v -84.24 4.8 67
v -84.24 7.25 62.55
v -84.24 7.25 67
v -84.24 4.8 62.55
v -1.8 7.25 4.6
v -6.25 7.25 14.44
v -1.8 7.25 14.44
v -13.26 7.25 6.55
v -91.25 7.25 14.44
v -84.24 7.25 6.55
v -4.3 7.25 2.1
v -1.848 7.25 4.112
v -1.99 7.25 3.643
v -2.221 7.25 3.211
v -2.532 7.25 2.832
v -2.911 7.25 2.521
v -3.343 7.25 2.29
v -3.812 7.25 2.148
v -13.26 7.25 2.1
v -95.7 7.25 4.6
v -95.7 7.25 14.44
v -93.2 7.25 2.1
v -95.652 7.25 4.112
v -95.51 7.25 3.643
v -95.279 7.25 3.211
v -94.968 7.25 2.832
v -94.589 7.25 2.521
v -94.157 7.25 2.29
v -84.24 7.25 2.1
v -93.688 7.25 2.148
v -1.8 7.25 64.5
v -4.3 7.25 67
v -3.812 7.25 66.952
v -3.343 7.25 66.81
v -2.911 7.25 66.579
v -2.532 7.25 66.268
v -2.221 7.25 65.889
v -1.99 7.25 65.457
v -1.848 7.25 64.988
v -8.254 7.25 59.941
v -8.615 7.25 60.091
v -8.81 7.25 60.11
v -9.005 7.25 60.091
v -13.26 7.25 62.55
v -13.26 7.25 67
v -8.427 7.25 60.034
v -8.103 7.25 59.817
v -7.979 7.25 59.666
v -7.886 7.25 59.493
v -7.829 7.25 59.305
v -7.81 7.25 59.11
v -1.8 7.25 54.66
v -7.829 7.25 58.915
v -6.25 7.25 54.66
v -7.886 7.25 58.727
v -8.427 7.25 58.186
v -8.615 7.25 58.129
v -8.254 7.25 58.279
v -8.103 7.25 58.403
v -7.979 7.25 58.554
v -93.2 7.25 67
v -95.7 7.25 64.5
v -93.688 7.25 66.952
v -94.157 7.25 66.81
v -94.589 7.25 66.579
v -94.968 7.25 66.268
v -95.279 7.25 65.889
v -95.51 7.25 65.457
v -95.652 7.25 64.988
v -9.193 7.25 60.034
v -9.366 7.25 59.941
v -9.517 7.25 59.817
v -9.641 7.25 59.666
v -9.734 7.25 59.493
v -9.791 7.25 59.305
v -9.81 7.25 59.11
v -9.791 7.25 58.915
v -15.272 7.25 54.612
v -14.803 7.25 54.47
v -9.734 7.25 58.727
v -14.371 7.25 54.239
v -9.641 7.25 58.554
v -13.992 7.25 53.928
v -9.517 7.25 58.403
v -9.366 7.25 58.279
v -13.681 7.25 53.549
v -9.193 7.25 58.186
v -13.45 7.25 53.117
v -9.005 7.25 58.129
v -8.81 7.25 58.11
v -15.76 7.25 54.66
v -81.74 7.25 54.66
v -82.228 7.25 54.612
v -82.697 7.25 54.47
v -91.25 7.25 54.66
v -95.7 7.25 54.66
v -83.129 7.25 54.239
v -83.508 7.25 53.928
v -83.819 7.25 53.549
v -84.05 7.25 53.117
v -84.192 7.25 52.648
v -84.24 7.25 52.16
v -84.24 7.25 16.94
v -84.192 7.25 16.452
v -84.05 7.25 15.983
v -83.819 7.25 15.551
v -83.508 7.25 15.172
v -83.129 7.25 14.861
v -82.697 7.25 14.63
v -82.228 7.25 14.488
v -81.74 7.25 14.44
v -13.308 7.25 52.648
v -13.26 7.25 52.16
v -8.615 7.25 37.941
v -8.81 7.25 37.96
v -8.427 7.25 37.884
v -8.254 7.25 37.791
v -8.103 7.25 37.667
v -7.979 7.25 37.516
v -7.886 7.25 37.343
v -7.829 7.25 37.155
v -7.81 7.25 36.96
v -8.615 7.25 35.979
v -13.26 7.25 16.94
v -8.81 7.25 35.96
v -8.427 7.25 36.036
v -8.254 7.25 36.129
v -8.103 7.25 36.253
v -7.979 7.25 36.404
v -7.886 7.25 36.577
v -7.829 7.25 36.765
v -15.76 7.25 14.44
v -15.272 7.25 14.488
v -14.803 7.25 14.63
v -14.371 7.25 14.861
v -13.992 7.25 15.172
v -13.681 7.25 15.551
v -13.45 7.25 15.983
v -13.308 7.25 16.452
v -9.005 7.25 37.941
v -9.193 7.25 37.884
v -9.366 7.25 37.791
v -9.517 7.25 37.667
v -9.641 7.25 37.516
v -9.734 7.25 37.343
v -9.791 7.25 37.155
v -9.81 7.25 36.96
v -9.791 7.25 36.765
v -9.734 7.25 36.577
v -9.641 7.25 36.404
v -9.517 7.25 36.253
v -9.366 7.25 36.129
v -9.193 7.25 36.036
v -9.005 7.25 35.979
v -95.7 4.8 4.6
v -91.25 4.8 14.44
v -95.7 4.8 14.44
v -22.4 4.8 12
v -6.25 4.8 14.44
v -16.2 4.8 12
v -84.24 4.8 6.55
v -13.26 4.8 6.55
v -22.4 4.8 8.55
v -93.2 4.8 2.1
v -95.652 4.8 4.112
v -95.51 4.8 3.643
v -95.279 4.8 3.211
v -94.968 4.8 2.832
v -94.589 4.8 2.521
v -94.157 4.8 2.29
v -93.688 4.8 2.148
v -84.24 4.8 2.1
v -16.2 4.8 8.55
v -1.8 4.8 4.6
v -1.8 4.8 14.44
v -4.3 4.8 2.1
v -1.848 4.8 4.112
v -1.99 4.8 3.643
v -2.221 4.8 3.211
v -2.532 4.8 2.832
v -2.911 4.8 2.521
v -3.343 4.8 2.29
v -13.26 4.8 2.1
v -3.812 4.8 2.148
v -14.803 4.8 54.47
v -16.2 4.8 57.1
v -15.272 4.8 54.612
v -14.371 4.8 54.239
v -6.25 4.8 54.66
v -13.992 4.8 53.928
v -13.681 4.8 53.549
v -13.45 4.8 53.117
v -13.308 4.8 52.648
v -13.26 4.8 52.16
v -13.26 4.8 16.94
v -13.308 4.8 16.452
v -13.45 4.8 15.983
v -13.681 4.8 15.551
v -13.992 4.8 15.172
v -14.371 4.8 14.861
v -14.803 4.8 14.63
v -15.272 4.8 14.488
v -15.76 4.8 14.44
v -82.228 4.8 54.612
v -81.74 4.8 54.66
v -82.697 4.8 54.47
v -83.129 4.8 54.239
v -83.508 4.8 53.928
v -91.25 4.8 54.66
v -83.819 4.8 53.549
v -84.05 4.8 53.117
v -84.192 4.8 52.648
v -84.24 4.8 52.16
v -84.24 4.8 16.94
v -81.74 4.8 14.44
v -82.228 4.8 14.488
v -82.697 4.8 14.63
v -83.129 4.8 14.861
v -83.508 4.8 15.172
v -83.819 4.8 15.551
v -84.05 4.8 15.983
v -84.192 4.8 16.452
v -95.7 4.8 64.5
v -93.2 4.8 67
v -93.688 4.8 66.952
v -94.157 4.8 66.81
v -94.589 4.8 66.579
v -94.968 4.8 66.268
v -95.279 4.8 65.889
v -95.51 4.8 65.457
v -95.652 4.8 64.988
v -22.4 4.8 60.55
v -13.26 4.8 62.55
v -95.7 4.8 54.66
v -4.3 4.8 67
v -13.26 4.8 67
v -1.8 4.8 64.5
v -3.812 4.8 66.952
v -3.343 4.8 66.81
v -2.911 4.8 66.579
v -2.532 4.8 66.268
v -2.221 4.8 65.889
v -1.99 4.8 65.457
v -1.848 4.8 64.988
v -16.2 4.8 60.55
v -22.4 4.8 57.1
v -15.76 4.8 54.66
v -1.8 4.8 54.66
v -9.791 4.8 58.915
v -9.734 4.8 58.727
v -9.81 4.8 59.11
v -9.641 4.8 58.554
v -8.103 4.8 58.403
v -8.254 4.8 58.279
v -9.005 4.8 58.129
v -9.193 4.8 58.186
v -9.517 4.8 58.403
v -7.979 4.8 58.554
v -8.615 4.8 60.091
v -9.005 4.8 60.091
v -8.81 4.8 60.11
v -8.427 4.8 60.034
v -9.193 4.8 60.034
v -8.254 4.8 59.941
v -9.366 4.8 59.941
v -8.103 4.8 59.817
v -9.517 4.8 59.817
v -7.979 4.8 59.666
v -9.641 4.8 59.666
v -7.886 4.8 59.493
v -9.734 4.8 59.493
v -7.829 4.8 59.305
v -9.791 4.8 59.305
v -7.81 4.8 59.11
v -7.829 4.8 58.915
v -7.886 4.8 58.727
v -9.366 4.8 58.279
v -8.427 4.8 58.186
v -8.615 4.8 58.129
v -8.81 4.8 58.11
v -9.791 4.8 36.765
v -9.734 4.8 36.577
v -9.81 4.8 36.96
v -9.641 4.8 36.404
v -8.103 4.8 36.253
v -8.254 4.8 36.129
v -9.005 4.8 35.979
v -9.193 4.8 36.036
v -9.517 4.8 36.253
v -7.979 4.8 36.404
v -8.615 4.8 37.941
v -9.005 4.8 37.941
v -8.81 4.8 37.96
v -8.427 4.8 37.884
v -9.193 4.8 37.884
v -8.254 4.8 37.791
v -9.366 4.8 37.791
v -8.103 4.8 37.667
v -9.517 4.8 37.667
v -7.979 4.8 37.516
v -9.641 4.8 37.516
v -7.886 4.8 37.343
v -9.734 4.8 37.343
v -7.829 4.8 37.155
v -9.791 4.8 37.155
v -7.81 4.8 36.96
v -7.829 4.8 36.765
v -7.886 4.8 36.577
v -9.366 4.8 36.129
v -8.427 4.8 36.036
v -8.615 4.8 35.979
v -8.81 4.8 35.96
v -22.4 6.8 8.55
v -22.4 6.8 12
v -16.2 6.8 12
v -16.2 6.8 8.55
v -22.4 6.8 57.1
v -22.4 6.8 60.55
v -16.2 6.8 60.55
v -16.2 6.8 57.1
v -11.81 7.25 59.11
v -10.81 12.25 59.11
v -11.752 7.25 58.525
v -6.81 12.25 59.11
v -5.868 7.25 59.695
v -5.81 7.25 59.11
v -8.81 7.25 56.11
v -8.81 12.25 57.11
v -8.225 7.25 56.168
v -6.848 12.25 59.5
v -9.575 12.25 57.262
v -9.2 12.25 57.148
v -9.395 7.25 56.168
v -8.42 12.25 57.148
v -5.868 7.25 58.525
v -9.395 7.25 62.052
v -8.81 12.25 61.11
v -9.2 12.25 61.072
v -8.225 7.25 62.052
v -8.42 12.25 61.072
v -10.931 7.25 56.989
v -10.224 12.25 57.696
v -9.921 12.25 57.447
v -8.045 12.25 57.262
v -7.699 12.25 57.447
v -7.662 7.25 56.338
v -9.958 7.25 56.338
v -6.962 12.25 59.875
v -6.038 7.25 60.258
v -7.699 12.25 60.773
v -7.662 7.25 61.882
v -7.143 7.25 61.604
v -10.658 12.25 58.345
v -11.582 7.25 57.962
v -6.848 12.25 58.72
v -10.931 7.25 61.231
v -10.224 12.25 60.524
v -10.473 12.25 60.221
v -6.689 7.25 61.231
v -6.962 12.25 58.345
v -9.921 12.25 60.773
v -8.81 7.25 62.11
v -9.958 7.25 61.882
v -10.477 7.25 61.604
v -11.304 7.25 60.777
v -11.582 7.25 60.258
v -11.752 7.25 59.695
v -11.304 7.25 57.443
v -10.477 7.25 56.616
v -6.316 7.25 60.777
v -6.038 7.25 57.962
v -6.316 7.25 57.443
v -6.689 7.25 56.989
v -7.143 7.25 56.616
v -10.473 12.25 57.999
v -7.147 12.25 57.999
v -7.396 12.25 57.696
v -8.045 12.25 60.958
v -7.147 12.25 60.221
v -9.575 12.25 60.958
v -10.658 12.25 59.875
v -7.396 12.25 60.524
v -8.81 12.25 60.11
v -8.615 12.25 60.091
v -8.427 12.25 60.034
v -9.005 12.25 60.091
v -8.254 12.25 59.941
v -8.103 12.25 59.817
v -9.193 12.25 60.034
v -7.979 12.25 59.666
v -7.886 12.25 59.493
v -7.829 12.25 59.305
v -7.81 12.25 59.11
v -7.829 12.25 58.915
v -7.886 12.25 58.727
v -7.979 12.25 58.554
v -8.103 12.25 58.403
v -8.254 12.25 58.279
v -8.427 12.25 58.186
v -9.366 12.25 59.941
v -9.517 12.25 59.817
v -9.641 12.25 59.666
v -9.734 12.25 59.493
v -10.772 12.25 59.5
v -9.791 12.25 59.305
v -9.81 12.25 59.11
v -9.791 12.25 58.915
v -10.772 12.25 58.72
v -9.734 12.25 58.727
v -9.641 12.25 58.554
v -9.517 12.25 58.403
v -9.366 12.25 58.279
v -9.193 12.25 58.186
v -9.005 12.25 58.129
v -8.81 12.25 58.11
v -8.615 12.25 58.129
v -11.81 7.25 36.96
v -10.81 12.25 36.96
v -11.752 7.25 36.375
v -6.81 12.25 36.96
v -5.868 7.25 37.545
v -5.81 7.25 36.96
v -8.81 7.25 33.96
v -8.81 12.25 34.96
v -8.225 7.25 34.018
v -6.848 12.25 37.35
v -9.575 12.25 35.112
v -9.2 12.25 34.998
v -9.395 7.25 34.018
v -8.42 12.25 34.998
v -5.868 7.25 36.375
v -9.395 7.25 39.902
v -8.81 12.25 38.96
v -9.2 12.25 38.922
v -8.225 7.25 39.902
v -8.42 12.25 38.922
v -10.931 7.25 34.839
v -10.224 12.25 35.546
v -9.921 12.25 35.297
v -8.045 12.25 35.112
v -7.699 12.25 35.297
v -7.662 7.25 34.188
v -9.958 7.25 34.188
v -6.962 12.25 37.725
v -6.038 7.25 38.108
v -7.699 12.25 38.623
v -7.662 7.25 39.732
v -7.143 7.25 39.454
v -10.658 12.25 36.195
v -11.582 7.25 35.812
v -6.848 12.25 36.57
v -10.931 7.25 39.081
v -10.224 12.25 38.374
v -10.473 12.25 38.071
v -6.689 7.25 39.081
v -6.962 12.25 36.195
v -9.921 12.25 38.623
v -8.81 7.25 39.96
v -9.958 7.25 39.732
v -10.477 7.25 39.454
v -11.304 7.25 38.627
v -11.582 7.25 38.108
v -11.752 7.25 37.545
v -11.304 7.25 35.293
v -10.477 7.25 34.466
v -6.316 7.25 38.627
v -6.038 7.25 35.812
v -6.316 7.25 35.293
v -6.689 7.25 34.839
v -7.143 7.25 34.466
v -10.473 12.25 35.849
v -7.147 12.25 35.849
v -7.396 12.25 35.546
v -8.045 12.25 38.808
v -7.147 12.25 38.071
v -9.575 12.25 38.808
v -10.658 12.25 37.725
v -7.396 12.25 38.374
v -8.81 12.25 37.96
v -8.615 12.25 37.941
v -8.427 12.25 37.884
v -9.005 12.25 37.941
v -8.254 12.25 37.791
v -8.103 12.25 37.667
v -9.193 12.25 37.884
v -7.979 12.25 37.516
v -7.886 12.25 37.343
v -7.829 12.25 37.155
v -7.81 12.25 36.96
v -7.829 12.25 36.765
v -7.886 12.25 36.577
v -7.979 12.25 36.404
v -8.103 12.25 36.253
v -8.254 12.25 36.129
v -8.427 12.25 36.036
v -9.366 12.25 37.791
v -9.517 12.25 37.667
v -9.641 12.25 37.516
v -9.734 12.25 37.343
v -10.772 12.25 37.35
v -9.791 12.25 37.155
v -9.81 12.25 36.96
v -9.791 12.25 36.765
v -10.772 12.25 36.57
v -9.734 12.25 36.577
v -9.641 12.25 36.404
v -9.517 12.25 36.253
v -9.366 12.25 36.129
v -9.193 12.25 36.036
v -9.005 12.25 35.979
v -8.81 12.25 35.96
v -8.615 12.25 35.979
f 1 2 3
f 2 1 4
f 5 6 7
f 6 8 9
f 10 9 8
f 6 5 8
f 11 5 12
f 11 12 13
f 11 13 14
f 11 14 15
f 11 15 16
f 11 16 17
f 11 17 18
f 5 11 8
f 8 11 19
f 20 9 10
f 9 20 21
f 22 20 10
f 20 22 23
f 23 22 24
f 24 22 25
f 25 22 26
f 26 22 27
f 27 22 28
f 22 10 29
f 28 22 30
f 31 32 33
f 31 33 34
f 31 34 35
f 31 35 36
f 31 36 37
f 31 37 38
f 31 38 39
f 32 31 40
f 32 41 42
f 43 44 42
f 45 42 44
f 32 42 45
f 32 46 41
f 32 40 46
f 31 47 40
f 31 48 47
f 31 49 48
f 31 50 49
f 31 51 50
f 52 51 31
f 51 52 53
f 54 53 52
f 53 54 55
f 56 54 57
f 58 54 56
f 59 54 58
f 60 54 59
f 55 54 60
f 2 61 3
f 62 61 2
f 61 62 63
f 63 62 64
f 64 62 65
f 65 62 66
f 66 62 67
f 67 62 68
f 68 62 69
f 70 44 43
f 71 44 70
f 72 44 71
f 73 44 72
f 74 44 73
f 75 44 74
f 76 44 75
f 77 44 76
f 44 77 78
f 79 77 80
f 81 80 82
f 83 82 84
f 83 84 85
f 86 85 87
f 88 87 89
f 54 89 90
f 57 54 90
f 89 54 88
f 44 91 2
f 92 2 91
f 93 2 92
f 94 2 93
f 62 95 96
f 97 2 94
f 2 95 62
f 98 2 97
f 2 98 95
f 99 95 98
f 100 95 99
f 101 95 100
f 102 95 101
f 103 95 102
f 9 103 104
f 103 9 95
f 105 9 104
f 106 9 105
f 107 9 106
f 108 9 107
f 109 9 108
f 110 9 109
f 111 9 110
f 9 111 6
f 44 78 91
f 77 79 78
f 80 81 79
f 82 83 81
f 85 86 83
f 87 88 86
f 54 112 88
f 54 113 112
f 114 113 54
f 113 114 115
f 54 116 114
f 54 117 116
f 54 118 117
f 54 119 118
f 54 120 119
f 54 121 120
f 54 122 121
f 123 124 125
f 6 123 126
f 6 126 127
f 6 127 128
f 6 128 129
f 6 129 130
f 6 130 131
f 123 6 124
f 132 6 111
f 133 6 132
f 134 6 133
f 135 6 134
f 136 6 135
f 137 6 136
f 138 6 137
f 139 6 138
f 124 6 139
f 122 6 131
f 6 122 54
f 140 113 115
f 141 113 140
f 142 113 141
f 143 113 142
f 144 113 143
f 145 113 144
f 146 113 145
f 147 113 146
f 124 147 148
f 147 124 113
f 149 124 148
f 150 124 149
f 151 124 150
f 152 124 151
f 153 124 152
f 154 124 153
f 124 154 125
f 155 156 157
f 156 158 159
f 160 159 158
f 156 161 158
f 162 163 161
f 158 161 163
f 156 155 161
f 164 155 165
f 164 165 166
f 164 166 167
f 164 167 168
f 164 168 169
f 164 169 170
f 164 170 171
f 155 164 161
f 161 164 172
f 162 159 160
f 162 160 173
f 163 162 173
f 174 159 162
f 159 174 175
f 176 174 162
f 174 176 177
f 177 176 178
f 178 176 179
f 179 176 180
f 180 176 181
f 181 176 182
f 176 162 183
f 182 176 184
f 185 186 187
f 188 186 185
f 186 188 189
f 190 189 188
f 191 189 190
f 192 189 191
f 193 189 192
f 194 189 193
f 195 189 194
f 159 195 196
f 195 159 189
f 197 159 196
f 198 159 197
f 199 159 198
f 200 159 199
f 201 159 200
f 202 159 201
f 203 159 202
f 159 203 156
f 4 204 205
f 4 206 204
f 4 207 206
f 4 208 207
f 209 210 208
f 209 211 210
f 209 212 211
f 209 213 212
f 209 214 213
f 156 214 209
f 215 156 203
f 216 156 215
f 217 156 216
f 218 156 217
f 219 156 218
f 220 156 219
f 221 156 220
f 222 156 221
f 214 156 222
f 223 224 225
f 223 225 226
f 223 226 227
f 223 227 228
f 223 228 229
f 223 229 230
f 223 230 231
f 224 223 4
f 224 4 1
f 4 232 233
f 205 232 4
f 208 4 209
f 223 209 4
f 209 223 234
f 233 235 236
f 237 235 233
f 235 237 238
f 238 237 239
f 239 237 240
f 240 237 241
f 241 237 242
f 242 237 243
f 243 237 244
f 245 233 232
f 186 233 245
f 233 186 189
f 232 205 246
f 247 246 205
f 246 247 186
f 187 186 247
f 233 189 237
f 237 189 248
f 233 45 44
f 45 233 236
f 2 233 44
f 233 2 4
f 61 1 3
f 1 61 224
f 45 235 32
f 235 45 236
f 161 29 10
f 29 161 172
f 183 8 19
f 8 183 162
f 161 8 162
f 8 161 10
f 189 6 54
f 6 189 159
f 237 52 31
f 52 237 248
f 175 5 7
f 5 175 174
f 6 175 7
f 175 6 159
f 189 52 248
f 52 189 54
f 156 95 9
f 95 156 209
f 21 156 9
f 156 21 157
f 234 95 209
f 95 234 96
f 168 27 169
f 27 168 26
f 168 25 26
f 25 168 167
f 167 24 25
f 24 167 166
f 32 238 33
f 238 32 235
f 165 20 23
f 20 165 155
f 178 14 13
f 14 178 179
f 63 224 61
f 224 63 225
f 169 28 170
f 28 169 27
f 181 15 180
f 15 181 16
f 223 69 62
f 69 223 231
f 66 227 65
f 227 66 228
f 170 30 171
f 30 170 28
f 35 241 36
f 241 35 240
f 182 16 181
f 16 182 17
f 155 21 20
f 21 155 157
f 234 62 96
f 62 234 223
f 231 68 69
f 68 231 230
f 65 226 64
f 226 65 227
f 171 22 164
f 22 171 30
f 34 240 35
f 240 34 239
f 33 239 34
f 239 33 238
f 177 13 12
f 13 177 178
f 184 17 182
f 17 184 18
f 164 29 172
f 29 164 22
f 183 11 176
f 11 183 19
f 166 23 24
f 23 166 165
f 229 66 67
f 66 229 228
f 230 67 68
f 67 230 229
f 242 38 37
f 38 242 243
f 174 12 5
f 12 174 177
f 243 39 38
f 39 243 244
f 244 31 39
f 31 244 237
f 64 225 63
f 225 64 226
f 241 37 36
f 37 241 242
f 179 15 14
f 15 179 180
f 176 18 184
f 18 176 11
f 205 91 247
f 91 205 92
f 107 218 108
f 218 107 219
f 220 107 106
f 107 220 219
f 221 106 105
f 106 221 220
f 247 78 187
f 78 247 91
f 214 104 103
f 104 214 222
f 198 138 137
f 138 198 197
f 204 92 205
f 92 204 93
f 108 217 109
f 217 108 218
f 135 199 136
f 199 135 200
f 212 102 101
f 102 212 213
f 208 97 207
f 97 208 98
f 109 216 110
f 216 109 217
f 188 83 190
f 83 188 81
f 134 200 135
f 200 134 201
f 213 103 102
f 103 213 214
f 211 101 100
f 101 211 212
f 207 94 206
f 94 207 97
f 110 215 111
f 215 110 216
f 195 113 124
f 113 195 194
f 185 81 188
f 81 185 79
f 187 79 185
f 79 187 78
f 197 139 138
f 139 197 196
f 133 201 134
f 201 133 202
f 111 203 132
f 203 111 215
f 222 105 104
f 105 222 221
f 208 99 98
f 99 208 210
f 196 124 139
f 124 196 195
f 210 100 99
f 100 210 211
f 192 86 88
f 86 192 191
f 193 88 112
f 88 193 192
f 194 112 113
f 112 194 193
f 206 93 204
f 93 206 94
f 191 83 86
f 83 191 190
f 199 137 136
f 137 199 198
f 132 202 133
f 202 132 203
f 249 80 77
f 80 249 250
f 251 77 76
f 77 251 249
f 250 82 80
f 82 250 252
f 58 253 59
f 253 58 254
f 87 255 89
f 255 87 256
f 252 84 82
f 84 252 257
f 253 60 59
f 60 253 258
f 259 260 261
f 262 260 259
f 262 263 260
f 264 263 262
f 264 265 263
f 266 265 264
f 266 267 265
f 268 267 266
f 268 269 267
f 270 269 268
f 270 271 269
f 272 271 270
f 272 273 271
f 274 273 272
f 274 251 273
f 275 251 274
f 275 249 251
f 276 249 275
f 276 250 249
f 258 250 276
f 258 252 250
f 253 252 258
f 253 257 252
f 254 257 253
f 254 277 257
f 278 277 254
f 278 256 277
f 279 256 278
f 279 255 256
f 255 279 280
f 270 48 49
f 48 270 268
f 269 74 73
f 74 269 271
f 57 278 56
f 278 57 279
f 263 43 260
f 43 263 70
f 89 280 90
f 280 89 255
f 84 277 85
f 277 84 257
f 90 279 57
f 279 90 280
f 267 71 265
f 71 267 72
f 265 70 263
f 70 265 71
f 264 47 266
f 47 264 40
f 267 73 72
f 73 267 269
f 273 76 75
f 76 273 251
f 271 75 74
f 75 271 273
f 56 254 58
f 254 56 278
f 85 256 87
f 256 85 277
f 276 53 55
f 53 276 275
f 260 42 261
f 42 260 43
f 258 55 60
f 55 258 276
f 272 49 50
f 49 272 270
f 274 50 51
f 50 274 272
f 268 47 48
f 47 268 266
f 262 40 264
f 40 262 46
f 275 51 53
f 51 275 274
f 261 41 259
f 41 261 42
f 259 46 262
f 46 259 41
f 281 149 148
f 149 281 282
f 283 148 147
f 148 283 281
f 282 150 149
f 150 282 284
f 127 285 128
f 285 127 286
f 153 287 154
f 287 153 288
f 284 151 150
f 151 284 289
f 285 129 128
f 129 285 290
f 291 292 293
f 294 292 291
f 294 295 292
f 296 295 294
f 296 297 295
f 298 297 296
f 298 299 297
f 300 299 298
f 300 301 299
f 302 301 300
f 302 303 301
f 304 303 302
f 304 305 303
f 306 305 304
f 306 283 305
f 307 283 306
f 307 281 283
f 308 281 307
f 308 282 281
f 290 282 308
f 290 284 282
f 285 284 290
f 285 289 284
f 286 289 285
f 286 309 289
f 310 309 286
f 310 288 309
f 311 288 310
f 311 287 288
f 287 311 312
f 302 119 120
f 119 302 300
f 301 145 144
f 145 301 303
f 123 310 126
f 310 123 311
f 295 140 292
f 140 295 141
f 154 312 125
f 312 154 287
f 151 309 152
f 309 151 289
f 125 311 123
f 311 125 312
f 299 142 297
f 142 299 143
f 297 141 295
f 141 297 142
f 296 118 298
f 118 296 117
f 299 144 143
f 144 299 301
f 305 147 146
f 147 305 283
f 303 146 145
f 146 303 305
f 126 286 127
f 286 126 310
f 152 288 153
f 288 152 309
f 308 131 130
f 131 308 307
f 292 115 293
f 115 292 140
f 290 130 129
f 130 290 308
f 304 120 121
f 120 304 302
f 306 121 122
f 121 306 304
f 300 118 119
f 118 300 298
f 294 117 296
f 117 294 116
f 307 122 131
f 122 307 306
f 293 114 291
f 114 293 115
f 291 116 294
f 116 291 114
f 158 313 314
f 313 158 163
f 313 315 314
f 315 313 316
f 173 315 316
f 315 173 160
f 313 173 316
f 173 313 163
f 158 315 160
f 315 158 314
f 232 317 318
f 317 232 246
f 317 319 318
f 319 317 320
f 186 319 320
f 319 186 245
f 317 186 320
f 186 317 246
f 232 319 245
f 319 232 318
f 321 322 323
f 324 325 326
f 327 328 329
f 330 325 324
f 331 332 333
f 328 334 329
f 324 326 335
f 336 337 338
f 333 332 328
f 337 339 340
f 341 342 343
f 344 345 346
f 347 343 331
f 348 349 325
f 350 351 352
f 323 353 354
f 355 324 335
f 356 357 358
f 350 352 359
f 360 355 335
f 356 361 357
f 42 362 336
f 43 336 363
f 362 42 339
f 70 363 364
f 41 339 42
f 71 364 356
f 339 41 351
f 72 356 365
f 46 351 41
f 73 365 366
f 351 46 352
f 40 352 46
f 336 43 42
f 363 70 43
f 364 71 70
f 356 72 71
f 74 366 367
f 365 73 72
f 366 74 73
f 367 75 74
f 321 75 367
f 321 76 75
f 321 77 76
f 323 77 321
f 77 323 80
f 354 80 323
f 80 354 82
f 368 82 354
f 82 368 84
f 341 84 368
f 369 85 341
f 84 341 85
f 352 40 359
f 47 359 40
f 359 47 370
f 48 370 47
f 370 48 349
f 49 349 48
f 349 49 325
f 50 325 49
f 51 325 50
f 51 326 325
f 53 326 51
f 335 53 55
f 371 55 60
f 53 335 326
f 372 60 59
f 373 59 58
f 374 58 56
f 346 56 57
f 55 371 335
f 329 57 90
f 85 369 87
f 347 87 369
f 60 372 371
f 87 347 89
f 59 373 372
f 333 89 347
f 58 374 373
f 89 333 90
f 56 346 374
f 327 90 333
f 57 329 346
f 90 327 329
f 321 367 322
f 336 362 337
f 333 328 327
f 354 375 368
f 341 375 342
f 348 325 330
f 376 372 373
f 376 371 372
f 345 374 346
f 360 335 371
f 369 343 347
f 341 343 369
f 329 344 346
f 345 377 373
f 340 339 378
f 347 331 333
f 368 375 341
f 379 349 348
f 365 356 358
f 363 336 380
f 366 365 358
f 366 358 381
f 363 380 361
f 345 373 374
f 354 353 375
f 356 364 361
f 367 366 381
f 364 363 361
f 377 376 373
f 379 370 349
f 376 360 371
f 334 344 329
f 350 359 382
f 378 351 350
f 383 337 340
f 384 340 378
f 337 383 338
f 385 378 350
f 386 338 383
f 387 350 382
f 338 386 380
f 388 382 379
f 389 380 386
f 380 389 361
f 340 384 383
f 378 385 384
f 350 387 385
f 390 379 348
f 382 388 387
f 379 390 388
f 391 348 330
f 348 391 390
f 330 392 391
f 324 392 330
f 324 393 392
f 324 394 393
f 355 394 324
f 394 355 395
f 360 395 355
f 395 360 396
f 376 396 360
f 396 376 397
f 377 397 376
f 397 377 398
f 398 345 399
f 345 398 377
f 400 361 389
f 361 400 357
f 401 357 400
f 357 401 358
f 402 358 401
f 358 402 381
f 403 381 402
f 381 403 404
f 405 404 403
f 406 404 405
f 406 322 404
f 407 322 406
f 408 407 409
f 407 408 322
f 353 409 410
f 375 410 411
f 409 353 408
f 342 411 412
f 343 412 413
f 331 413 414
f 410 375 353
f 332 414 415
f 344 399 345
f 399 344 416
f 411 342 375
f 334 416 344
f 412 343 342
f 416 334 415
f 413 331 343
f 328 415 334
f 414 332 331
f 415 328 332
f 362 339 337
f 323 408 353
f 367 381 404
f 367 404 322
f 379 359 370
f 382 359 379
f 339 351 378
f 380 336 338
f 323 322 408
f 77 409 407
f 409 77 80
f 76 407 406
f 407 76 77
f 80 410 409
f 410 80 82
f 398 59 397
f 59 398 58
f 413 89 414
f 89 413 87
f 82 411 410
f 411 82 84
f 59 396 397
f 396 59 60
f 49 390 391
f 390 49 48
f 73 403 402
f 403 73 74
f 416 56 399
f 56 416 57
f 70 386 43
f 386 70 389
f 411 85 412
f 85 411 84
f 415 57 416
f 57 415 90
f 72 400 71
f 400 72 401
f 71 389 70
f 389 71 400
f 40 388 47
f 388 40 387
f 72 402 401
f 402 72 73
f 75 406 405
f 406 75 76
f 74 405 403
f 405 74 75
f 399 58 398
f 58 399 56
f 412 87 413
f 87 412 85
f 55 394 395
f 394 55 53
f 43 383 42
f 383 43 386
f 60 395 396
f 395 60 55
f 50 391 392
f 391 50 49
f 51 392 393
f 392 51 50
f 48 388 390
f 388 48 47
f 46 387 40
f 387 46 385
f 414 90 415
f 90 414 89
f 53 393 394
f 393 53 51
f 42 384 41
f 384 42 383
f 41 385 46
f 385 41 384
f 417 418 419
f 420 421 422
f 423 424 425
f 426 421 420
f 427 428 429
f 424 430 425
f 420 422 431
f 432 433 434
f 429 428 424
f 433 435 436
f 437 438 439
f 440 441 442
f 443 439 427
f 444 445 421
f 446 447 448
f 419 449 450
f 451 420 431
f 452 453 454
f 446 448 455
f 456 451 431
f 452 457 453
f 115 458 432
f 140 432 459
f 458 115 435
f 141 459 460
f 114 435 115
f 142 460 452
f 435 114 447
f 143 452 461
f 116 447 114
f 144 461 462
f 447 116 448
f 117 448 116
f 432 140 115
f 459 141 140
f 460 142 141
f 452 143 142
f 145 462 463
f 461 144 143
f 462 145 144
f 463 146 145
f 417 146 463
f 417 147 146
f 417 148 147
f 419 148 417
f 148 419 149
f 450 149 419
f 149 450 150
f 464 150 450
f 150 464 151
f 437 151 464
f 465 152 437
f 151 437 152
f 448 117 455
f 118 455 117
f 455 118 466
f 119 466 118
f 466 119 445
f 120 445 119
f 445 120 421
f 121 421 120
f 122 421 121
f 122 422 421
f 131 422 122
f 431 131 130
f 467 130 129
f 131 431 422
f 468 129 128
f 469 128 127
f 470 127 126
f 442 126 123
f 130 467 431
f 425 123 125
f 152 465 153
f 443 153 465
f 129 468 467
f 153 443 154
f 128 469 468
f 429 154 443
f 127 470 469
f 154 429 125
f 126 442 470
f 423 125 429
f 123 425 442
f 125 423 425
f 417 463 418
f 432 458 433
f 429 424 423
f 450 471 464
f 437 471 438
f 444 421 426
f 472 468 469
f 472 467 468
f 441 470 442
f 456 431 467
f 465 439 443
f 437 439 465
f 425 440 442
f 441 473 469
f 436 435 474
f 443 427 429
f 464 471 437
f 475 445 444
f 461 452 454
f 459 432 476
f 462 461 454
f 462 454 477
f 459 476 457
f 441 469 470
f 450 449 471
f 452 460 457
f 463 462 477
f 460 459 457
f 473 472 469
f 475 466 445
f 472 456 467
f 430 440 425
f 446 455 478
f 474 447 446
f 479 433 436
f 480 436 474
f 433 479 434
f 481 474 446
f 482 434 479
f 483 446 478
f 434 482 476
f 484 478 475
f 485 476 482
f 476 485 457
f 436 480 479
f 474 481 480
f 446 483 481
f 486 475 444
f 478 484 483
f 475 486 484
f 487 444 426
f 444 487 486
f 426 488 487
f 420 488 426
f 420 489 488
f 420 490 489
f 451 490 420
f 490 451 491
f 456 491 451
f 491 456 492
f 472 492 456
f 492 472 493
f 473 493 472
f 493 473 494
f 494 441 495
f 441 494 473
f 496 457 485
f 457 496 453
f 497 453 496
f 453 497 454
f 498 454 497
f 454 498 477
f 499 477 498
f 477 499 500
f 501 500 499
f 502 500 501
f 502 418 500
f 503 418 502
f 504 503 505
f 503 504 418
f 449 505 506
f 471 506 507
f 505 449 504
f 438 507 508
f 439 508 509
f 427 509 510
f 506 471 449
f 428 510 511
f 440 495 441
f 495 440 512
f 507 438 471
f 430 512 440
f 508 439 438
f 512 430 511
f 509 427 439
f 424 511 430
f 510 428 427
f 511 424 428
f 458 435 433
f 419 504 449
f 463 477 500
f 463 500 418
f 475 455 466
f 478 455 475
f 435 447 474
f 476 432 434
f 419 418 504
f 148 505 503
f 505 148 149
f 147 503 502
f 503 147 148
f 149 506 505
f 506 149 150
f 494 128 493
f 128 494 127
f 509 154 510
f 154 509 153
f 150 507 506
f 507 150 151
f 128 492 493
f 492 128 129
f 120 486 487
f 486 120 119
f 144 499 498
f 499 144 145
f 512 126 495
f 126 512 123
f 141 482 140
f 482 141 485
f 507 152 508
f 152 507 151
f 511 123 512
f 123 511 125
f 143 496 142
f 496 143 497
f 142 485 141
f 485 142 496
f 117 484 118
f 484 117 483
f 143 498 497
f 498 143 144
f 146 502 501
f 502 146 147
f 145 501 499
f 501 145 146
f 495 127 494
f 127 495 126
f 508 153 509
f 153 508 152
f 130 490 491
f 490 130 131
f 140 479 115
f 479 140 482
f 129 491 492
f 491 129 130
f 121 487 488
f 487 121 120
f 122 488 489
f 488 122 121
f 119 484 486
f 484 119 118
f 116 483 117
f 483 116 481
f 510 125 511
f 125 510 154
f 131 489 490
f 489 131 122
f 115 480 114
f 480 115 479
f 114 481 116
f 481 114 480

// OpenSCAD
$fn=32;

/*********************
*  board dimensions  *
*********************/

// raspberry pi 4b
sbc_x = 85;
sbc_y = 56;
sbc_screw_dia = 2.7;
sbc_screw_rim_x = 3.5;
sbc_screw_x     = 58;
sbc_screw_rim_y = 3.5;
sbc_screw_y     = 49;
sbc_screw_h     = 3;

// ups dimensions
ups_x           = 85;
ups_y           = 56;
ups_screw_dia   = 2.7;
ups_screw_rim_x = 3.5;
ups_screw_x     = 58;
ups_screw_rim_y = 3.5+5;
ups_screw_y     = 49;
ups_screw_h     = 3;

// esp32 dimensions
esp_x           = 64.47;
esp_y           = 27;
esp_screw_dia   = 2;
esp_screw_rim_x = 2.56;
esp_screw_x     = 0;
esp_screw_rim_y = 3.44;
esp_screw_y     = 22.15;


// raspberry pi zero 2W
/*
sbc_x           = 65;
sbc_y           = 30;
sbc_screw_dia   = 2.7;
sbc_screw_rim_x = 3.5;
sbc_screw_x     = 58;
sbc_screw_rim_y = 3.5;
sbc_screw_y     = 23;
sbc_screw_h     = 0.4;

// ups dimensions
ups_x           = 0;
ups_y           = 0;
ups_screw_dia   = 2.7;
ups_screw_rim_x = 3.5;
ups_screw_x     = 58;
ups_screw_rim_y = 3.5;
ups_screw_y     = 49;

// esp32 dimensions
esp_x           = 64.47;
esp_y           = 27;
esp_screw_dia   = 2;
esp_screw_rim_x = 2.56;
esp_screw_x     = 0;
esp_screw_rim_y = 3.44;
esp_screw_y     = 22.15;
*/


/********************
*  case dimensions  *
********************/

// backplane
backplane_y             = 100;
backplane_x             = 120;
backplane_wall          = 1.8;
backplane_screw_dia     = 2.7;
backplane_screw_x       = 0;
backplane_screw_rim_x   = backplane_x/2;
backplane_screw_y       = 77.5;
backplane_screw_rim_y   = (backplane_y - backplane_screw_y)/2;
backplane_slots         = 3;

// carrier
carrier_frame_x         = max(sbc_x,ups_x,esp_x);
carrier_frame_y         = max(sbc_y,ups_y,esp_y);
carrier_frame_height    = 3;
carrier_frame_addition  = 5;
carrier_screw_h         = 5;
carrier_distance        = 27.2;
carrier_gap             = 0.55;

// battery
battery_x               = backplane_x-2*backplane_wall;
battery_y               = max(60,carrier_frame_y+2*carrier_frame_addition);
battery_h               = 11;

// solar adapter
solar_x                 = 19.5;
solar_y                 = 38.5;
solar_z                 = 11.3;


mirror([1,0,0])
{
    esp_carrier();
}
//sbc_carrier();
//ups_carrier();
//case();

/************
*  modules  *
************/

module case()
{
    // main case
    difference()
    {
        cube_round([backplane_x,
                    backplane_y,
                    max(carrier_frame_y+2*carrier_frame_addition,battery_y)]
                  +[0,0,backplane_wall]);
        
        // inner cutout
        translate([backplane_wall,backplane_wall,backplane_wall])
        {
            cube_round([backplane_x,
                        backplane_y,
                        max(carrier_frame_y+2*carrier_frame_addition,
                            battery_y)]
                      -[2*backplane_wall,2*backplane_wall,0]);
        }
        // board access
        translate([0,backplane_wall,backplane_wall+carrier_frame_addition])
        {
            cube([backplane_wall,
                  min(backplane_slots*carrier_distance,
                      backplane_y-battery_h-3*backplane_wall),
                  carrier_frame_y]);
        }
        // wall cutout
        translate([backplane_wall+carrier_frame_addition-2,
                   0,
                   carrier_frame_addition+backplane_wall])
        {
            cube_round([backplane_x,backplane_y-battery_h-4*backplane_wall,300],plane="xz");
            translate([2*backplane_wall,0,0])
                cube_round([backplane_x,backplane_y-battery_h-2*backplane_wall,300],plane="yz");
        }
        // bottom cutout
        translate([carrier_frame_addition+backplane_wall+10+5+backplane_wall,
                   3*backplane_wall,
                   0])
        {
            cube_round([backplane_x/2
                        -(carrier_frame_addition+backplane_wall+10+5+backplane_wall)
                        -backplane_screw_dia/2-backplane_wall,
                         backplane_y-battery_h-7*backplane_wall,
                         backplane_wall]);
            translate([0,+battery_h/2+backplane_screw_dia/2+2*backplane_wall,0])
            {
                cube_round([carrier_frame_x-15,
                            backplane_screw_y-battery_h-backplane_screw_dia+2*backplane_wall,
                            backplane_wall]);
            }
        }
        //screw holes
        translate([0,0,backplane_wall])
        {
            screw_holes(screw_dia=backplane_screw_dia,
                    screw_rim_x=backplane_screw_rim_x,
                    screw_x=backplane_screw_x,
                    screw_rim_y=backplane_screw_rim_y,
                    screw_y=backplane_screw_y,
                    screw_h=0,
                    frame_height=backplane_wall,
                    massive=true);
        }
    }

    // battery box
    translate([0,backplane_y-2*backplane_wall-battery_h,backplane_wall])
    {
        battery_box(x=battery_x,
                    y=battery_y,
                    h=battery_h,
                    wall=backplane_wall);
    }
    
    // solar box
    translate([backplane_x-solar_x-2*backplane_wall,5,0])
    {
        solar(x=solar_x,
              y=solar_y,
              z=solar_z,
              wall=backplane_wall);
    }

    // carrier holder
    carrier_holder(height1=carrier_frame_y+2*carrier_frame_addition,
                   height2=carrier_frame_addition,
                   wall=backplane_wall,
                   carrier_frame_height=carrier_frame_height,
                   carrier_frame_addition=carrier_frame_addition,
                   carrier_frame_x=carrier_frame_x+2*carrier_frame_addition);
}




// battery box
module battery_box(x,y,h,wall)
{
    // location of cable opening
    cable_loc_x = 80;
    cable_dim_x = 10;
    cable_dim_y = 10;
    airgap      = 5;
    
    difference()
    {
        cube_round([x,h,y]
                  +[2*wall,2*wall,0]);
        
        // inner cutout
        translate([wall,wall,0])
        {
            cube_round([x,h,y]);
        }
        
        // cable opening
        translate([cable_loc_x,0,-wall])
        {
            cube_round([cable_dim_x,wall,cable_dim_y],plane="xz");
        }
        
        // air gaps
        for(i=[airgap:2*airgap:backplane_x-2*airgap])
        {
            translate([wall+i,0,cable_dim_y+airgap])
            {
                cube_round([airgap,wall,y-2*airgap-cable_dim_y],mki=airgap-1,plane="xz");
            }
        }
    }
}

// solar box
module solar(x,y,z,wall)
{
    difference()
    {
        cube_round([x,y,z]+[2*wall,2*wall-5,wall],mki=2);
        translate([wall,wall,wall])
        {
            cube([x,y+wall-5,z]);
        }
        translate([wall,-5,wall])
        {
            cube([x,y-5,3.2]);
        }
    }
    translate([wall,y+wall-5,wall])
    {
        cube([x,wall,3.2]);
    }
    translate([wall,y-wall-5,wall])
    {
        cube([x,2*wall,1.3]);
    }
    translate([wall+x/2-5/2,0,wall])
    {
        cube([5,2*wall,1.3]);
    }
}

// esp carrier
module esp_carrier()
{
    translate([backplane_wall,
               backplane_wall+carrier_frame_addition-2,
               backplane_wall+carrier_frame_y+2*carrier_frame_addition-0.8])
    {
        rotate([270,0,0])
        {
            carrier(x=carrier_frame_x,
                    y=carrier_frame_y,
                    frame_height=carrier_frame_height-carrier_gap,
                    frame_addition=carrier_frame_addition-carrier_gap,
                    screw_rim_x=esp_screw_rim_x,
                    screw_x=esp_screw_x,
                    screw_rim_y=esp_screw_rim_y,
                    screw_y=esp_screw_y,
                    screw_h=carrier_screw_h,
                    screw_dia=esp_screw_dia,
                    cut_sides="xy");
        }
    }
}

// sbc carrier
module sbc_carrier()
{
    translate([backplane_wall,
               backplane_wall+carrier_distance+carrier_frame_addition-2,
               backplane_wall+carrier_frame_y+2*carrier_frame_addition-0.8])
    {
        rotate([270,0,0])
        {
            carrier(x=carrier_frame_x,
                    y=carrier_frame_y,
                    frame_height=carrier_frame_height-carrier_gap,
                    frame_addition=carrier_frame_addition-carrier_gap,
                    screw_rim_x=sbc_screw_rim_x,
                    screw_x=sbc_screw_x,
                    screw_rim_y=sbc_screw_rim_y,
                    screw_y=sbc_screw_y,
                    screw_h=sbc_screw_h,
                    screw_dia=sbc_screw_dia,
                    cut_sides="xy");
        }
    }
}

// ups carrier
module ups_carrier()
{
    translate([backplane_wall,
               backplane_wall+2*carrier_distance+carrier_frame_addition-2,
               backplane_wall+carrier_frame_y+2*carrier_frame_addition-0.8])
    {
        rotate([270,0,0])
        {
            carrier(x=carrier_frame_x,
                    y=carrier_frame_y,
                    frame_height=carrier_frame_height-carrier_gap,
                    frame_addition=carrier_frame_addition-carrier_gap,
                    screw_rim_x=ups_screw_rim_x,
                    screw_x=ups_screw_x,
                    screw_rim_y=ups_screw_rim_y,
                    screw_y=ups_screw_y,
                    screw_h=ups_screw_h,
                    screw_dia=ups_screw_dia,
                    cut_sides="x");
        }
    }
}





// carrier holder
module carrier_holder(height1,
                      height2=10,
                      wall,
                      carrier_frame_height,
                      carrier_frame_addition,
                      carrier_frame_x)
{

    for(dist=[wall
             :carrier_distance
             :min(backplane_y-battery_h-3*wall-carrier_distance,
                  backplane_slots*carrier_distance)])
    {
        translate([0,dist,0])
        {
            cube([wall,2*(carrier_frame_addition-2)+carrier_frame_height,height1]);
            holder(depth=carrier_frame_addition-2,
                   width=carrier_frame_addition-2,
                   height=height1,
                   wall=wall,
                   carrier_frame_height=carrier_frame_height);

            translate([carrier_frame_x-carrier_frame_addition+2,0,0])
            {
                holder(depth=carrier_frame_addition-2,
                       width=carrier_frame_addition-2,
                       height=height2,
                       wall=wall,
                       carrier_frame_height=carrier_frame_height);
            }
            // clip
            translate([carrier_frame_addition+wall+10,1,wall])
            {
                clip();
            }
        }
    }
    // low wall
    translate([wall+carrier_frame_x,wall,wall])
    {
        cube([wall,
              min(backplane_y-battery_h-carrier_distance+2,
                  (backplane_slots-1)*carrier_distance+2*(carrier_frame_addition-2)+carrier_frame_height),
              height2]);
    }
}


// holder element
module holder(depth,width,height,wall,carrier_frame_height)
{
    //cube([wall,2*width+carrier_frame_height,height]);
    translate([wall,0,wall])
    {
        cube([depth,width,height]);
        translate([0,width+carrier_frame_height,0])
        {
            cube([depth,width,height]);
        }
    }
}


module carrier(x,
               y,
               frame_height,
               frame_addition,
               screw_rim_x,
               screw_x,
               screw_rim_y,
               screw_y,
               screw_h,
               screw_dia,
               screw_h=5,
               cut_sides)
{
    difference()
    {
        carrier_frame(x=x,
                      y=y,
                      frame_height=frame_height,
                      frame_addition=frame_addition,
                      screw_rim_x=screw_rim_x,
                      screw_rim_y=screw_rim_y,
                      cut_sides=cut_sides);
        translate([frame_addition,frame_addition,frame_height])
        {
            screw_holes(screw_dia=screw_dia,
                        screw_rim_x=screw_rim_x,
                        screw_x=screw_x,
                        screw_rim_y=screw_rim_y,
                        screw_y=screw_y,
                        screw_h=screw_h,
                        frame_height=frame_height,
                        massive=true);
        }
        // gap for clip
        translate([carrier_frame_addition+10-0.6,y-1,0]){
            cube([5+2*0.6,frame_addition-1,2]);
        }
        //translate([-(5+2*0.6+1)+x-carrier_frame_addition,carrier_frame_addition+2,0]){
        //    #cube([7+2*0.6,frame_addition-1,2]);
        //}
        translate([carrier_frame_addition+10-0.6,frame_addition+2,0]){
            #cube([5+2*0.6,frame_addition-1,2]);
        }
    }
    translate([frame_addition,frame_addition,frame_height])
    {
        screw_holes(screw_dia=screw_dia,
                        screw_rim_x=screw_rim_x,
                        screw_x=screw_x,
                        screw_rim_y=screw_rim_y,
                        screw_y=screw_y,
                        screw_h=screw_h,
                        frame_height=frame_height,
                        massive=false);
    }
}


// carrier_frame frame module
module carrier_frame(x,
                     y,
                     frame_height,
                     frame_addition,
                     screw_rim_x,
                     screw_rim_y,
                     cut_sides="x")
{
    difference()
    {
        cube_round([x+2*frame_addition,y+2*frame_addition,frame_height]);
        // center cutout
        translate([2*frame_addition+screw_rim_x,
                   2*frame_addition+screw_rim_y,
                   0])
        {
            cube_round([x-2*(frame_addition+screw_rim_x),
                   y-2*(frame_addition+screw_rim_y),
                   frame_height]);
        }
        // side cutouts
        if(cut_sides == "y" || cut_sides == "xy")
        {
            translate([2*frame_addition+screw_rim_x,0,0])
            {
                cube([x-2*(frame_addition+screw_rim_x),
                      frame_addition,
                      frame_height]);
            }
            translate([2*frame_addition+screw_rim_x,y+frame_addition,0])
            {
                cube([x-2*(frame_addition+screw_rim_x),
                      frame_addition,
                      frame_height]);
            }
        }
        if(cut_sides == "x" || cut_sides == "xy")
        {
            translate([0,2*frame_addition+screw_rim_y,0])
            {
                cube([frame_addition,
                       y-2*(frame_addition+screw_rim_y),
                       frame_height]);
            }
            translate([x+frame_addition,2*frame_addition+screw_rim_y,0])
            {
                cube([frame_addition,
                       y-2*(frame_addition+screw_rim_y),
                       frame_height]);
            }
        }
    }
}


module screw_holes(screw_dia,
                   screw_rim_x,
                   screw_x,
                   screw_rim_y,
                   screw_y,
                   screw_h,
                   frame_height,
                   massive=false)
{
    translate([screw_rim_x,screw_rim_y,0])
    {
        screw_hole(dia=screw_dia,
                   height=screw_h,
                   depth=frame_height,
                   massive=massive);
    }
    translate([screw_rim_x,screw_rim_y+screw_y,0])
    {
        screw_hole(dia=screw_dia,
                   height=screw_h,
                   depth=frame_height,
                   massive=massive);
    }
    translate([screw_rim_x+screw_x,screw_rim_y+screw_y,0])
    {
        screw_hole(dia=screw_dia,
                   height=screw_h,
                   depth=frame_height,
                   massive=massive);
    }
    translate([screw_rim_x+screw_x,screw_rim_y,0])
    {
        screw_hole(dia=screw_dia,
                   height=screw_h,
                   depth=frame_height,
                   massive=massive);
    }
}

module screw_hole(dia,height,depth,massive=false)
{
    d1=4;
    d2=2;
    
    if(massive){
        cylinder(h=height,d1=dia+d1,d2=dia+d2);
        translate([0,0,-depth])
        {
            cylinder(h=height+depth,d=dia);
        }
    }
    else
    {
        difference(){
            cylinder(h=height,d1=dia+d1,d2=dia+d2);
            translate([0,0,-depth])
            {
                cylinder(h=height+depth,d=dia);
            }
        }
    }
}


module clip(width=5,thickness=2)
{
    cube([width,thickness,carrier_frame_addition+2]);
    
    translate([0,0,carrier_frame_addition+2])
    {
        difference()
        {
            cube([width,3,5]);
            translate([0,5,0])
            {
                rotate([45,0,0])
                {
                    cube([width,5,10]);
                }
            }
        }
    }
}


module cube_round(dim,mki=5,plane="xy"){
    if(mki<=0)
    {
        cube(dim);
    }
    else
    {
        if(plane=="xy")
        {
            translate([mki/2,mki/2,0])
            {
                linear_extrude(dim[2])
                {
                    minkowski()
                    {
                        square([dim[0]-mki,dim[1]-mki]);
                        circle(d=mki);
                    }
                }
            }
        }
        if(plane=="yz")
        {
            translate([0,mki/2,dim[2]-mki/2])
            {
                rotate([0,90,0])
                {
                    linear_extrude(dim[0])
                    {
                        minkowski()
                        {
                            square([dim[2]-mki,dim[1]-mki]);
                            circle(d=mki);
                        }
                    }
                }
            }
        }
        if(plane=="xz")
        {
            translate([mki/2,dim[1],mki/2])
            {
                rotate([90,0,0])
                {
                    linear_extrude(dim[1])
                    {
                        minkowski()
                        {
                            square([dim[0]-mki,dim[2]-mki]);
                            circle(d=mki);
                        }
                    }
                }
            }
        }
    }
}
